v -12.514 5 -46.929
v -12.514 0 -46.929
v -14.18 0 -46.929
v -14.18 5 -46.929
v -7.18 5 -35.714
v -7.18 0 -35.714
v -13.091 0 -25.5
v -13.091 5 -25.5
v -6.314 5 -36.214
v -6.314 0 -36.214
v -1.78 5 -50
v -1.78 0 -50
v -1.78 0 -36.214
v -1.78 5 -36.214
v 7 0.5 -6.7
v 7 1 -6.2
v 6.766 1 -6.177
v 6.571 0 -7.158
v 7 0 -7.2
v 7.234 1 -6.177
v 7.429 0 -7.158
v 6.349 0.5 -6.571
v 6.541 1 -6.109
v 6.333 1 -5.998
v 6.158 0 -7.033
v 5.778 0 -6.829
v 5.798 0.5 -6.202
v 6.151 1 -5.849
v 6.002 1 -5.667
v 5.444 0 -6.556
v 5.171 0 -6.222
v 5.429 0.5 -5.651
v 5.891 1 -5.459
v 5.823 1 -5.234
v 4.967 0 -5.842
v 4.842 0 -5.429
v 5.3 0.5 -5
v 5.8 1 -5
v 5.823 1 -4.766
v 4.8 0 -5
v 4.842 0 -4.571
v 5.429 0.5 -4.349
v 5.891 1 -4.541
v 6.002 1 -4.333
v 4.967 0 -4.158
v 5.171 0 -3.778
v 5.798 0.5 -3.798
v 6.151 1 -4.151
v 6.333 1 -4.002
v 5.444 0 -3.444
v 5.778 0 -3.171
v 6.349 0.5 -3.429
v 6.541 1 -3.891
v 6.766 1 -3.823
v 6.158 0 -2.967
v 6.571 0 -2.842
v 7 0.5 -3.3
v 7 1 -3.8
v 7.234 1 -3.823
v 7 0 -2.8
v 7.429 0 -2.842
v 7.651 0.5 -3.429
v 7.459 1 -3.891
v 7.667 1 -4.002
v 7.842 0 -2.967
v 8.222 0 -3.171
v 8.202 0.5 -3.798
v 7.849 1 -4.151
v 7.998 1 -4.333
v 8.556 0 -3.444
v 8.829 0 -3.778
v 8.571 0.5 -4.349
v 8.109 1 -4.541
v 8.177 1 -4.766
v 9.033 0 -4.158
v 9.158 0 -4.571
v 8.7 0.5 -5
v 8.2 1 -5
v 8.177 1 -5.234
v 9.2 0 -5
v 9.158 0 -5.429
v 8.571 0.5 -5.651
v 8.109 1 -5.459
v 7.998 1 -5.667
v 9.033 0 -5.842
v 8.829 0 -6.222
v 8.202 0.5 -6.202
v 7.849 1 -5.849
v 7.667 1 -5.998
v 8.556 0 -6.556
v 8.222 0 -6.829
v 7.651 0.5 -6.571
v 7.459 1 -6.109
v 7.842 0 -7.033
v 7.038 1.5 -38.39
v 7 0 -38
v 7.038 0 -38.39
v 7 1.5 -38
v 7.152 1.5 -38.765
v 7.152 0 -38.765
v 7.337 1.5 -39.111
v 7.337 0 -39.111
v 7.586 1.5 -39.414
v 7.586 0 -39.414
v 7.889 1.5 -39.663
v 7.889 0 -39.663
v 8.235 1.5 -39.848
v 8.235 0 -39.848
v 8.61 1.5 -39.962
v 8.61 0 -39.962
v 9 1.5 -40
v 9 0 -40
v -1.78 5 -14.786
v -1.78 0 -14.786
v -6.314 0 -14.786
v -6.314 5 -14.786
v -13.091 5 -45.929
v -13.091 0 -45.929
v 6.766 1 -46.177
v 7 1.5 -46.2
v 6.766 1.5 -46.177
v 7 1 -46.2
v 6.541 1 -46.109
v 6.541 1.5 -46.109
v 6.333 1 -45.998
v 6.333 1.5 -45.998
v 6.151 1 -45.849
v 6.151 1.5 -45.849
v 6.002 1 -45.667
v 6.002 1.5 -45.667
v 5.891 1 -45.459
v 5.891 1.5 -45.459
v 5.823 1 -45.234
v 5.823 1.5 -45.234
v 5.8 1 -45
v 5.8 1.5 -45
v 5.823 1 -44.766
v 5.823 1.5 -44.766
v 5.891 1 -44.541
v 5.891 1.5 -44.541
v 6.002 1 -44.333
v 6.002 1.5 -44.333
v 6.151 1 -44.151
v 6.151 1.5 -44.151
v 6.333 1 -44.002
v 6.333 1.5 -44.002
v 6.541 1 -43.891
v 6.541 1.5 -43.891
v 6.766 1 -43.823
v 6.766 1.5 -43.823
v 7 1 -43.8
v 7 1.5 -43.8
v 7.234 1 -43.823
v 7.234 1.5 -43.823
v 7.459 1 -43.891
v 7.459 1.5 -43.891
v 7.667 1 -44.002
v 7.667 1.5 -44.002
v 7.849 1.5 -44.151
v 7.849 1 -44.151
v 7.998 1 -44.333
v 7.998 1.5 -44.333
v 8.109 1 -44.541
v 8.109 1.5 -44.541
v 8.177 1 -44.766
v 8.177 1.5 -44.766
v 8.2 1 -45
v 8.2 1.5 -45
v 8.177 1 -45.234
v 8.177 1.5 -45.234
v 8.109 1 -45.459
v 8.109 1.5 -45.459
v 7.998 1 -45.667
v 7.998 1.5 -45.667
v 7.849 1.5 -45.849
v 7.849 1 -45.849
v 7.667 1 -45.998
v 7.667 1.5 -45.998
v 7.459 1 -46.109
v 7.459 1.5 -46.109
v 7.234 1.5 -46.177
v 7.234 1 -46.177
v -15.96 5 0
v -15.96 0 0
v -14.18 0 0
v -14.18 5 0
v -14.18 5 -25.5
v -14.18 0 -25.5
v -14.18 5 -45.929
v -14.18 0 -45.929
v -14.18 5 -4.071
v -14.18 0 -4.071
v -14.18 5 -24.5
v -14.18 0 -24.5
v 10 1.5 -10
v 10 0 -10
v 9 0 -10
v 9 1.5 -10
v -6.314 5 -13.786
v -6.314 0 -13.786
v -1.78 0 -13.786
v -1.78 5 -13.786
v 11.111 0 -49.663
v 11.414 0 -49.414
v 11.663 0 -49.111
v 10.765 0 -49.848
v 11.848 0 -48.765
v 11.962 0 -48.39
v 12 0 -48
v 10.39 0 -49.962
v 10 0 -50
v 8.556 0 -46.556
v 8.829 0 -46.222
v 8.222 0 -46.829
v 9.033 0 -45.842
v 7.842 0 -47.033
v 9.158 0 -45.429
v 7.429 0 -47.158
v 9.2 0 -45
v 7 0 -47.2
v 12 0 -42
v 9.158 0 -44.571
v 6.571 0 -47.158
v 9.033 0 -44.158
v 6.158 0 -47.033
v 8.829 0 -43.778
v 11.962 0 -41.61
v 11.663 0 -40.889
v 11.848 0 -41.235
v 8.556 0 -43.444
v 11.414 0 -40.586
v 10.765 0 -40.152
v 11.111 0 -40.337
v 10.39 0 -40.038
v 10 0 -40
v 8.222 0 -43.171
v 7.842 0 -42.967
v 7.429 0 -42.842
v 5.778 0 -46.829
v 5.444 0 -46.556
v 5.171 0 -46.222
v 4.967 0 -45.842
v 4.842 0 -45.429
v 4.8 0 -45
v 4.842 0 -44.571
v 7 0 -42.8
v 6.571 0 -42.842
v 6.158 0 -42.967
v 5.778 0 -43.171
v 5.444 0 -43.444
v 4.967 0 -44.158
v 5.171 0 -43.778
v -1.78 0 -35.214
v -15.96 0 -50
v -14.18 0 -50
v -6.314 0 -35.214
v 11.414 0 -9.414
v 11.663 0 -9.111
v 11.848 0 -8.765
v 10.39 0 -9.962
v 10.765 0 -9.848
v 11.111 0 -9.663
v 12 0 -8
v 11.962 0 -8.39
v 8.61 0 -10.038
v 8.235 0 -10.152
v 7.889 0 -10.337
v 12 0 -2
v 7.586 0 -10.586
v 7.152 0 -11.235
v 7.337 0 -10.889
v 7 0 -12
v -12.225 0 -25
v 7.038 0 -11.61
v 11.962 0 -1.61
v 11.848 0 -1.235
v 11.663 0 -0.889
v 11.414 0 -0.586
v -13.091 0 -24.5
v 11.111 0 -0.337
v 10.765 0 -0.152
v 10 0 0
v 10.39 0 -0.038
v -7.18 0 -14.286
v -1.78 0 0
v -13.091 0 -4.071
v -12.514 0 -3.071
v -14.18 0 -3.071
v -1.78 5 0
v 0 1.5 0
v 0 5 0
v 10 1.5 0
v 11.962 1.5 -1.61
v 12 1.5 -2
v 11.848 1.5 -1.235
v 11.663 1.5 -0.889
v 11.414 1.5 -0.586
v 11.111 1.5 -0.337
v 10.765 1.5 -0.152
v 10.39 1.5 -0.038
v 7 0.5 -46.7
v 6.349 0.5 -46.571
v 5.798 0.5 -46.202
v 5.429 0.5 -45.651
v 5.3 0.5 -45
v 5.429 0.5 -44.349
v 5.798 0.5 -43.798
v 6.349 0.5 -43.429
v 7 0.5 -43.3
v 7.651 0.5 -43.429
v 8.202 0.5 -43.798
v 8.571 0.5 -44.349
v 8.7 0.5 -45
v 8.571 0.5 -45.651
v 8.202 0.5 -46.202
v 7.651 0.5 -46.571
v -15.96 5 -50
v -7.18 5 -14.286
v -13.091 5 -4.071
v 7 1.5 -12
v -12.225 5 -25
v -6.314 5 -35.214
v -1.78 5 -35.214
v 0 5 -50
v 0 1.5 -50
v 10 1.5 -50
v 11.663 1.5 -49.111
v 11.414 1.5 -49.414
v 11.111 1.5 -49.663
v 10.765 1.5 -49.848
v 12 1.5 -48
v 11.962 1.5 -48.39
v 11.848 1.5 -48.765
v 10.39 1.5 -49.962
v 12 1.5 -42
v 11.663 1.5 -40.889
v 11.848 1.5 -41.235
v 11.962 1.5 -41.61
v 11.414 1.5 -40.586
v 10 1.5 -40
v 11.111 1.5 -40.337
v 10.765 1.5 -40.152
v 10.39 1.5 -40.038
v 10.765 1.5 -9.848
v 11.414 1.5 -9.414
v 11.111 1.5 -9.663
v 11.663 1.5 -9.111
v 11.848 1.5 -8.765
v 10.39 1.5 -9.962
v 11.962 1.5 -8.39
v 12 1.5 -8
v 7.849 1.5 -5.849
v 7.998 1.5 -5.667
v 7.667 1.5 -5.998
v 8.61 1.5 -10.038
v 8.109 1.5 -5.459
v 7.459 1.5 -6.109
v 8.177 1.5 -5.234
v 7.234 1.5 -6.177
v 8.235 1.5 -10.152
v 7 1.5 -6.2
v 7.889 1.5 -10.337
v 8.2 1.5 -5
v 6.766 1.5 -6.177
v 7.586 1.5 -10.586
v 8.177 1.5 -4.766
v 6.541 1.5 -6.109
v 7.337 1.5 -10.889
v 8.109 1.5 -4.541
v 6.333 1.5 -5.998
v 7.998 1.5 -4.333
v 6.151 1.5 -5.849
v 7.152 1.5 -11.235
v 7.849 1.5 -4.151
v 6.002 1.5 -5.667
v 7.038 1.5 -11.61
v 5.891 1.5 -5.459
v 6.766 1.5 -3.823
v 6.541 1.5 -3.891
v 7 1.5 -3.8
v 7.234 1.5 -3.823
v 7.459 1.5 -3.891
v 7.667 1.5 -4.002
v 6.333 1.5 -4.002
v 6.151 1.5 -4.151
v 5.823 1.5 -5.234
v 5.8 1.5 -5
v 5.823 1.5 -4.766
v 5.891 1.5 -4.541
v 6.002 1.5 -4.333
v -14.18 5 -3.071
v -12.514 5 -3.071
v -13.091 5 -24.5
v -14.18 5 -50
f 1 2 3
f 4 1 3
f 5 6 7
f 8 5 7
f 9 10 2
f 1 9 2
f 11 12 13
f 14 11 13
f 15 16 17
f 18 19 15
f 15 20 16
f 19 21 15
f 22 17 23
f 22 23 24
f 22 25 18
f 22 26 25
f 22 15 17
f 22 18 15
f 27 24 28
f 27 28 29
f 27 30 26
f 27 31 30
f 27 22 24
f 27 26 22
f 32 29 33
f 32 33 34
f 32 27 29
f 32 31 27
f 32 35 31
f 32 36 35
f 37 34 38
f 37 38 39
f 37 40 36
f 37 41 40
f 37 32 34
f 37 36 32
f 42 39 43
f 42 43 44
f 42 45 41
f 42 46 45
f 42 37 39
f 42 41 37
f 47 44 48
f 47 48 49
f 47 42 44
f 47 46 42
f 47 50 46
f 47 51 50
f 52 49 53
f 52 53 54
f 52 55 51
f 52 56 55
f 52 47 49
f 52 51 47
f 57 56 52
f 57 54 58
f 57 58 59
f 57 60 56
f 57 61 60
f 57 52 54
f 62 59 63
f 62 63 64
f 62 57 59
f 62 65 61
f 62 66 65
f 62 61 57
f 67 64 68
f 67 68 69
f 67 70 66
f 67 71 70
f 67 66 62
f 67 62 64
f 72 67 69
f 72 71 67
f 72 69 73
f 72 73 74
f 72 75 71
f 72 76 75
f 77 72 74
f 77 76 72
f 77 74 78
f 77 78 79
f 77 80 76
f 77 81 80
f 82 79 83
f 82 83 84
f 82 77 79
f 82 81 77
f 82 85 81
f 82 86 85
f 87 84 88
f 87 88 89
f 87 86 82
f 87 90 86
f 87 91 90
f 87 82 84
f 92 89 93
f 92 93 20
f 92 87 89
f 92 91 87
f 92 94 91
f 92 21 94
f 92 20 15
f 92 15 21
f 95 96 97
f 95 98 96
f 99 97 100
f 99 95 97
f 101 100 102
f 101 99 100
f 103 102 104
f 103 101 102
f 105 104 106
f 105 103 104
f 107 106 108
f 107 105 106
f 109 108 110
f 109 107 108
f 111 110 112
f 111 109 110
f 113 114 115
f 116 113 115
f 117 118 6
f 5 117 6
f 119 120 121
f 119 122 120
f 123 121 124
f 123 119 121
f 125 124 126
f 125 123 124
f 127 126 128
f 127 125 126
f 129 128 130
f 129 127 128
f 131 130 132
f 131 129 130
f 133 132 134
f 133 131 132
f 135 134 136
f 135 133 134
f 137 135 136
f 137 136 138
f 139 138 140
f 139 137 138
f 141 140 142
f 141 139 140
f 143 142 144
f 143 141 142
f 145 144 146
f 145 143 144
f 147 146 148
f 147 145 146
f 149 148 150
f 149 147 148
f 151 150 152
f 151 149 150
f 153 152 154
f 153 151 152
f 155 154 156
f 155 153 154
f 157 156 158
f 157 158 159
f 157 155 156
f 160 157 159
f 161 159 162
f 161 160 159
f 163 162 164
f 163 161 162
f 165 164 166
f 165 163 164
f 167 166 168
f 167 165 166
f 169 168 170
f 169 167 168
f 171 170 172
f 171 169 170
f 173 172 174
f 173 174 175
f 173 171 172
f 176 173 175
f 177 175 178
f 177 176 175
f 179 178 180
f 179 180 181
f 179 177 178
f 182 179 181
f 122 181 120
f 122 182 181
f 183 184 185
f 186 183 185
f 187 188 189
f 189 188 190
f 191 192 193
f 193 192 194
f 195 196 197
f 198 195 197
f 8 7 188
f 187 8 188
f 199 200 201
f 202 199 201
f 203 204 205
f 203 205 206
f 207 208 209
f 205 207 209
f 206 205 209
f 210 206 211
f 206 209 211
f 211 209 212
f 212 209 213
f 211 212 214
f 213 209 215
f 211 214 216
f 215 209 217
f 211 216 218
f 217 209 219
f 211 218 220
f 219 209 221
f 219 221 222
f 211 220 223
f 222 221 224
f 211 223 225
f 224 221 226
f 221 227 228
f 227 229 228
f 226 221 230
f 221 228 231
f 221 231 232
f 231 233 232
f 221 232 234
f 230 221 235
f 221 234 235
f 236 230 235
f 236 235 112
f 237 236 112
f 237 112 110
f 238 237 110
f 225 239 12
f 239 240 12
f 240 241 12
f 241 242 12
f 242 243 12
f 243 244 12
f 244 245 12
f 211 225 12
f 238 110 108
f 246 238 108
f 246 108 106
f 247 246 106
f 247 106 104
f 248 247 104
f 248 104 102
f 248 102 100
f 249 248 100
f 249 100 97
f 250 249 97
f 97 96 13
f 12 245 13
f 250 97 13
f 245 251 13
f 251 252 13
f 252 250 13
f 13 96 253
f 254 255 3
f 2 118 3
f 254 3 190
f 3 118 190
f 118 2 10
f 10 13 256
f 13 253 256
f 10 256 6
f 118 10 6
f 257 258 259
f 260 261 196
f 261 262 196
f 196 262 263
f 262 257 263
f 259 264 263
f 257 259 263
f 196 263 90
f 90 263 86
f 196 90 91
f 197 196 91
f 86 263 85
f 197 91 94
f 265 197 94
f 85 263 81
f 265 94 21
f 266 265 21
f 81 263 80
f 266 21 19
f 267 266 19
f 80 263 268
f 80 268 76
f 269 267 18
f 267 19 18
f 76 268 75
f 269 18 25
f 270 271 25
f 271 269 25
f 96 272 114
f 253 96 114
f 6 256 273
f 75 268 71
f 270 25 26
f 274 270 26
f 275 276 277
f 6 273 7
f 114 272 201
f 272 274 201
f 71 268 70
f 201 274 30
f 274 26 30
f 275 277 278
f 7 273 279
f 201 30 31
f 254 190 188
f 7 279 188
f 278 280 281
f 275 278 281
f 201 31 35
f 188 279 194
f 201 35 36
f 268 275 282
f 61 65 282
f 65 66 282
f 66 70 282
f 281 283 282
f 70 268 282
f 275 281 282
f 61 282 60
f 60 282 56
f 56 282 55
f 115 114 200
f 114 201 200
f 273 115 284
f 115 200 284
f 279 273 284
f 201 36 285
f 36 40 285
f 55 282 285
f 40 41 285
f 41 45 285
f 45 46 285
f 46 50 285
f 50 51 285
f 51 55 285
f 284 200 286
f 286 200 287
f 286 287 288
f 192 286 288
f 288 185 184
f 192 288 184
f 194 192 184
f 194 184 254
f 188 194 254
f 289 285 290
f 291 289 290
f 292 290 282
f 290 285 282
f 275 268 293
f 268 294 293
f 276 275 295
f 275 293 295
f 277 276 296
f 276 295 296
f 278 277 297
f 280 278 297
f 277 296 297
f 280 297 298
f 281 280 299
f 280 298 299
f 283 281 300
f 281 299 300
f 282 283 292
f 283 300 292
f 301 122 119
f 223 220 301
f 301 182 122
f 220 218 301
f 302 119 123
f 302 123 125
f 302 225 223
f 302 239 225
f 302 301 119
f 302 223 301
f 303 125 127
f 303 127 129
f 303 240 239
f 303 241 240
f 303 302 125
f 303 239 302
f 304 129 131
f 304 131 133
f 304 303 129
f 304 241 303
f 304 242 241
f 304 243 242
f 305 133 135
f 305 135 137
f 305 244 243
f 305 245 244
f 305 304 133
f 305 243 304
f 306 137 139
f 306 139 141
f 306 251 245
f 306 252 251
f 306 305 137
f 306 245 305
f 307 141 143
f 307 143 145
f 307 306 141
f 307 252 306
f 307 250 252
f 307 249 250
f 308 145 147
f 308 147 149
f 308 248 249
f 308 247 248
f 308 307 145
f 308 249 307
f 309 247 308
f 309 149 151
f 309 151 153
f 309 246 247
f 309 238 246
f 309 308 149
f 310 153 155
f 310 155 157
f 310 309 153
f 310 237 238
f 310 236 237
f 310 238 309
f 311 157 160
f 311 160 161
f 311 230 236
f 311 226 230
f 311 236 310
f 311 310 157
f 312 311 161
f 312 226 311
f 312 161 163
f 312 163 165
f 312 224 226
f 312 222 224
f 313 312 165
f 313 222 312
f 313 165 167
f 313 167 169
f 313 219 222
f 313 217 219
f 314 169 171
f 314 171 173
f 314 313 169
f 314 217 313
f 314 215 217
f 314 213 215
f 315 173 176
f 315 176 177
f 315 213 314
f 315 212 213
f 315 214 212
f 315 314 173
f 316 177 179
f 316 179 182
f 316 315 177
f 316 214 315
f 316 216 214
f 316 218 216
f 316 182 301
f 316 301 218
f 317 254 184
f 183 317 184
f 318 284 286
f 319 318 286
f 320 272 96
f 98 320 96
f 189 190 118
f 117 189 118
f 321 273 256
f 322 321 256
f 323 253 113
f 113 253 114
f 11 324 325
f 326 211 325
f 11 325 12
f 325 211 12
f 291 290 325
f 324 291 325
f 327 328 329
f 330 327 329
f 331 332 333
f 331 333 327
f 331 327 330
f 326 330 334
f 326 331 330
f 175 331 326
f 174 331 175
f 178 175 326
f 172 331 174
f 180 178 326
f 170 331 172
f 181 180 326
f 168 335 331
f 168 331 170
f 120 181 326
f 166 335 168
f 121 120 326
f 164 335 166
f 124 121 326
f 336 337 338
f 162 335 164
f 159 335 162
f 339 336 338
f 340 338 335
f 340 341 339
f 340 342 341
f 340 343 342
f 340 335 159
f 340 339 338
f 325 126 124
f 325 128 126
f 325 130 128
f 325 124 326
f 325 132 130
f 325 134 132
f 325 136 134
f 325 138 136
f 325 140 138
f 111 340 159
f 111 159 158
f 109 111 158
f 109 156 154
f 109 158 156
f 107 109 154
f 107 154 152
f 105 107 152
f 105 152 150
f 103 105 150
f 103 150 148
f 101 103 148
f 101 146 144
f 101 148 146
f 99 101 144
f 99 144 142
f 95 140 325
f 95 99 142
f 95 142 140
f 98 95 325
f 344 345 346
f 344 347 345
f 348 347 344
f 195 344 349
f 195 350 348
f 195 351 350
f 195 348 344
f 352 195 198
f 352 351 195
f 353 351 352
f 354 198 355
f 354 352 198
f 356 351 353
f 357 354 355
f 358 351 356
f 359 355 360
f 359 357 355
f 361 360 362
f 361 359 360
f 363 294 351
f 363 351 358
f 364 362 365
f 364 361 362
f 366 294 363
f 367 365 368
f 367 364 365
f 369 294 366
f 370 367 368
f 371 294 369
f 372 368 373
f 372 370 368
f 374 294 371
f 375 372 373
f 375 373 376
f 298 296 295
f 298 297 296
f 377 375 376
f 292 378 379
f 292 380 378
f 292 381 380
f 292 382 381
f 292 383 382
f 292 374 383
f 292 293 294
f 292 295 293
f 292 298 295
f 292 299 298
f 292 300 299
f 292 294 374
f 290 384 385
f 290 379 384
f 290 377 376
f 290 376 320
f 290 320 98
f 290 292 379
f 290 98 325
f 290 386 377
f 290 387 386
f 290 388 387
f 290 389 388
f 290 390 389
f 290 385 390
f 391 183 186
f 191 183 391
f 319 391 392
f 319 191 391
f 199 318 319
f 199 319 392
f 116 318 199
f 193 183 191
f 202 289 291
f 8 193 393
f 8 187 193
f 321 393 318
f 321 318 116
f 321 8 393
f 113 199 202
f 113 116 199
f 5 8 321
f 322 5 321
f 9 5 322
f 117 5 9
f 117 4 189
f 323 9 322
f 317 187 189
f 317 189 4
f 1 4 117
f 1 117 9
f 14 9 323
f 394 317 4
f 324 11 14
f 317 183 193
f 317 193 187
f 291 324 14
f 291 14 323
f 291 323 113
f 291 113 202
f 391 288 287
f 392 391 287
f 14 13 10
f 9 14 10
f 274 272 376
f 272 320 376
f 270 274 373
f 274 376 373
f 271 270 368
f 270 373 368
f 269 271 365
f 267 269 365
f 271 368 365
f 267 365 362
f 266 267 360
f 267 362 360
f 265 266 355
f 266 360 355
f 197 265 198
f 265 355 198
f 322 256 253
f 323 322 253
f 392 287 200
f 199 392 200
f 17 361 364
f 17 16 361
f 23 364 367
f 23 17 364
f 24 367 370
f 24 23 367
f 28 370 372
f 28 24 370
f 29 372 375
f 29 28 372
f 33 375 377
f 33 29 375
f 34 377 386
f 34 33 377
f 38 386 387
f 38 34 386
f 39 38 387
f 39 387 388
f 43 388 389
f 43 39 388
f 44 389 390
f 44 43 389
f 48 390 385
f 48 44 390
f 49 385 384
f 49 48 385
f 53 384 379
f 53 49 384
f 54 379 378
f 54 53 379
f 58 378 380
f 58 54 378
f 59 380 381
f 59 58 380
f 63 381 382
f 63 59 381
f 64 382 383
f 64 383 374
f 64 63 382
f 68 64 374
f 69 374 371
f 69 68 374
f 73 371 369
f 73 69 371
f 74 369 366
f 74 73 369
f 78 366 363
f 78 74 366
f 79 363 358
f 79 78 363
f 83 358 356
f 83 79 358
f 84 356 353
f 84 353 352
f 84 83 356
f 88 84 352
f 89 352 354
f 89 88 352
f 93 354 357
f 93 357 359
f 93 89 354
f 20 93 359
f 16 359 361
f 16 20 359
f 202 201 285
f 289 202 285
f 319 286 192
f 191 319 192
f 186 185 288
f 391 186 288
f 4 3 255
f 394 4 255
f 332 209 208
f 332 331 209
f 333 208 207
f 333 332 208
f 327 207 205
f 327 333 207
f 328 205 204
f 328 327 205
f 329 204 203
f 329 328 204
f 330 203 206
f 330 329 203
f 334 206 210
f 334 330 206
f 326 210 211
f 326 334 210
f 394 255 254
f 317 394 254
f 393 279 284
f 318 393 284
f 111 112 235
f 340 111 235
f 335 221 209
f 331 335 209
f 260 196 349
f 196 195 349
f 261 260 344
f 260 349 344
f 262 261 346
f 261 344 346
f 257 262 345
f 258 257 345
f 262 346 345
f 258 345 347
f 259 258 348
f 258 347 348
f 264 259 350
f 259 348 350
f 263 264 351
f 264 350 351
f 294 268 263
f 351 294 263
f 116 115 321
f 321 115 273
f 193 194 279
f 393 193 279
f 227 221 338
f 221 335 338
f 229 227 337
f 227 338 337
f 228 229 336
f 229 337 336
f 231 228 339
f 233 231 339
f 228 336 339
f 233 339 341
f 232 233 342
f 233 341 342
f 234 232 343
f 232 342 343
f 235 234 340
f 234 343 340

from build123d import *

# Parameters (mm, degrees)
BOSS_EXTRUDE1_DEPTH                            = 5
BOSS_EXTRUDE3_DEPTH                            = 1.5
FILLET1_R                                      = 2
CSK_FOR_M2_FLAT_HEAD_MACHINE_SCREW1_AT_2_COUNT = 2
CSK_FOR_M2_FLAT_HEAD_MACHINE_SCREW1_AT_2_PITCH = 40


with BuildPart() as part:
    # Sketch1 → Boss-Extrude1 (new body)
    with BuildSketch(Plane(origin=(0, 0, 0), x_dir=(1, 0, 0), z_dir=(0, 1, 0))):
        Polygon((-14.18, 46.928571429), (-14.18, 50), (-15.96, 50), (-15.96, 0), (-14.18, 0), (-14.18, 3.071428571), (-12.513875906, 3.071428571), (-6.313875906, 13.785714286), (-1.78, 13.785714286), (-1.78, 0), (0, 0), (0, 50), (-1.78, 50), (-1.78, 36.214285714), (-6.313875906, 36.214285714), (-12.513875906, 46.928571429), align=None)
        Polygon((-14.18, 4.071428571), (-14.18, 24.5), (-13.090568539, 24.5), (-7.179901872, 14.285714286), (-13.090568539, 4.071428571), align=None, mode=Mode.SUBTRACT)
        Polygon((-13.090568539, 45.928571429), (-7.179901872, 35.714285714), (-13.090568539, 25.5), (-14.18, 25.5), (-14.18, 45.928571429), align=None, mode=Mode.SUBTRACT)
        Polygon((-6.313875906, 14.785714286), (-12.224542572, 25), (-6.313875906, 35.214285714), (-1.78, 35.214285714), (-1.78, 14.785714286), align=None, mode=Mode.SUBTRACT)
    extrude(amount=BOSS_EXTRUDE1_DEPTH)

    # Sketch5 → Boss-Extrude3 (add)
    with BuildSketch(Plane.XZ):
        Polygon((12, -40), (12, -50), (0, -50), (0, 0), (12, 0), (12, -10), (7, -10), (7, -40), align=None)
    extrude(amount=-BOSS_EXTRUDE3_DEPTH)

    # Fillet1
    fillet1_edges = [part.edges().sort_by_distance(p)[0] for p in [
        (12, 0.75, 0),
        (12, 0.75, -10),
        (7, 0.75, -10),
        (7, 0.75, -40),
        (12, 0.75, -40),
        (12, 0.75, -50),
    ]]
    fillet(fillet1_edges, radius=FILLET1_R)

    # Sketch6 → CSK for M2 Flat Head Machine Screw1 (revolve, cut)
    with BuildSketch(Plane(origin=(7, 0, -5), x_dir=(0, 0, -1), z_dir=(1, 0, 0))):
        Polygon((0, 0), (0, 1.5), (1.2, 1.5), (1.2, 1), (2.2, 0), align=None)
    csk_for_m2_flat_head_machine_screw1 = revolve(axis=Axis((7, -6.35, -5), (0, 1, 0)), mode=Mode.SUBTRACT)

    # CSK for M2 Flat Head Machine Screw1 at 2: CSK for M2 Flat Head Machine Screw1 ×2
    with Locations(*[(0, 0, -i * CSK_FOR_M2_FLAT_HEAD_MACHINE_SCREW1_AT_2_PITCH) for i in range(1, CSK_FOR_M2_FLAT_HEAD_MACHINE_SCREW1_AT_2_COUNT)]):
        add(csk_for_m2_flat_head_machine_screw1, mode=Mode.SUBTRACT)


solid = part.part
